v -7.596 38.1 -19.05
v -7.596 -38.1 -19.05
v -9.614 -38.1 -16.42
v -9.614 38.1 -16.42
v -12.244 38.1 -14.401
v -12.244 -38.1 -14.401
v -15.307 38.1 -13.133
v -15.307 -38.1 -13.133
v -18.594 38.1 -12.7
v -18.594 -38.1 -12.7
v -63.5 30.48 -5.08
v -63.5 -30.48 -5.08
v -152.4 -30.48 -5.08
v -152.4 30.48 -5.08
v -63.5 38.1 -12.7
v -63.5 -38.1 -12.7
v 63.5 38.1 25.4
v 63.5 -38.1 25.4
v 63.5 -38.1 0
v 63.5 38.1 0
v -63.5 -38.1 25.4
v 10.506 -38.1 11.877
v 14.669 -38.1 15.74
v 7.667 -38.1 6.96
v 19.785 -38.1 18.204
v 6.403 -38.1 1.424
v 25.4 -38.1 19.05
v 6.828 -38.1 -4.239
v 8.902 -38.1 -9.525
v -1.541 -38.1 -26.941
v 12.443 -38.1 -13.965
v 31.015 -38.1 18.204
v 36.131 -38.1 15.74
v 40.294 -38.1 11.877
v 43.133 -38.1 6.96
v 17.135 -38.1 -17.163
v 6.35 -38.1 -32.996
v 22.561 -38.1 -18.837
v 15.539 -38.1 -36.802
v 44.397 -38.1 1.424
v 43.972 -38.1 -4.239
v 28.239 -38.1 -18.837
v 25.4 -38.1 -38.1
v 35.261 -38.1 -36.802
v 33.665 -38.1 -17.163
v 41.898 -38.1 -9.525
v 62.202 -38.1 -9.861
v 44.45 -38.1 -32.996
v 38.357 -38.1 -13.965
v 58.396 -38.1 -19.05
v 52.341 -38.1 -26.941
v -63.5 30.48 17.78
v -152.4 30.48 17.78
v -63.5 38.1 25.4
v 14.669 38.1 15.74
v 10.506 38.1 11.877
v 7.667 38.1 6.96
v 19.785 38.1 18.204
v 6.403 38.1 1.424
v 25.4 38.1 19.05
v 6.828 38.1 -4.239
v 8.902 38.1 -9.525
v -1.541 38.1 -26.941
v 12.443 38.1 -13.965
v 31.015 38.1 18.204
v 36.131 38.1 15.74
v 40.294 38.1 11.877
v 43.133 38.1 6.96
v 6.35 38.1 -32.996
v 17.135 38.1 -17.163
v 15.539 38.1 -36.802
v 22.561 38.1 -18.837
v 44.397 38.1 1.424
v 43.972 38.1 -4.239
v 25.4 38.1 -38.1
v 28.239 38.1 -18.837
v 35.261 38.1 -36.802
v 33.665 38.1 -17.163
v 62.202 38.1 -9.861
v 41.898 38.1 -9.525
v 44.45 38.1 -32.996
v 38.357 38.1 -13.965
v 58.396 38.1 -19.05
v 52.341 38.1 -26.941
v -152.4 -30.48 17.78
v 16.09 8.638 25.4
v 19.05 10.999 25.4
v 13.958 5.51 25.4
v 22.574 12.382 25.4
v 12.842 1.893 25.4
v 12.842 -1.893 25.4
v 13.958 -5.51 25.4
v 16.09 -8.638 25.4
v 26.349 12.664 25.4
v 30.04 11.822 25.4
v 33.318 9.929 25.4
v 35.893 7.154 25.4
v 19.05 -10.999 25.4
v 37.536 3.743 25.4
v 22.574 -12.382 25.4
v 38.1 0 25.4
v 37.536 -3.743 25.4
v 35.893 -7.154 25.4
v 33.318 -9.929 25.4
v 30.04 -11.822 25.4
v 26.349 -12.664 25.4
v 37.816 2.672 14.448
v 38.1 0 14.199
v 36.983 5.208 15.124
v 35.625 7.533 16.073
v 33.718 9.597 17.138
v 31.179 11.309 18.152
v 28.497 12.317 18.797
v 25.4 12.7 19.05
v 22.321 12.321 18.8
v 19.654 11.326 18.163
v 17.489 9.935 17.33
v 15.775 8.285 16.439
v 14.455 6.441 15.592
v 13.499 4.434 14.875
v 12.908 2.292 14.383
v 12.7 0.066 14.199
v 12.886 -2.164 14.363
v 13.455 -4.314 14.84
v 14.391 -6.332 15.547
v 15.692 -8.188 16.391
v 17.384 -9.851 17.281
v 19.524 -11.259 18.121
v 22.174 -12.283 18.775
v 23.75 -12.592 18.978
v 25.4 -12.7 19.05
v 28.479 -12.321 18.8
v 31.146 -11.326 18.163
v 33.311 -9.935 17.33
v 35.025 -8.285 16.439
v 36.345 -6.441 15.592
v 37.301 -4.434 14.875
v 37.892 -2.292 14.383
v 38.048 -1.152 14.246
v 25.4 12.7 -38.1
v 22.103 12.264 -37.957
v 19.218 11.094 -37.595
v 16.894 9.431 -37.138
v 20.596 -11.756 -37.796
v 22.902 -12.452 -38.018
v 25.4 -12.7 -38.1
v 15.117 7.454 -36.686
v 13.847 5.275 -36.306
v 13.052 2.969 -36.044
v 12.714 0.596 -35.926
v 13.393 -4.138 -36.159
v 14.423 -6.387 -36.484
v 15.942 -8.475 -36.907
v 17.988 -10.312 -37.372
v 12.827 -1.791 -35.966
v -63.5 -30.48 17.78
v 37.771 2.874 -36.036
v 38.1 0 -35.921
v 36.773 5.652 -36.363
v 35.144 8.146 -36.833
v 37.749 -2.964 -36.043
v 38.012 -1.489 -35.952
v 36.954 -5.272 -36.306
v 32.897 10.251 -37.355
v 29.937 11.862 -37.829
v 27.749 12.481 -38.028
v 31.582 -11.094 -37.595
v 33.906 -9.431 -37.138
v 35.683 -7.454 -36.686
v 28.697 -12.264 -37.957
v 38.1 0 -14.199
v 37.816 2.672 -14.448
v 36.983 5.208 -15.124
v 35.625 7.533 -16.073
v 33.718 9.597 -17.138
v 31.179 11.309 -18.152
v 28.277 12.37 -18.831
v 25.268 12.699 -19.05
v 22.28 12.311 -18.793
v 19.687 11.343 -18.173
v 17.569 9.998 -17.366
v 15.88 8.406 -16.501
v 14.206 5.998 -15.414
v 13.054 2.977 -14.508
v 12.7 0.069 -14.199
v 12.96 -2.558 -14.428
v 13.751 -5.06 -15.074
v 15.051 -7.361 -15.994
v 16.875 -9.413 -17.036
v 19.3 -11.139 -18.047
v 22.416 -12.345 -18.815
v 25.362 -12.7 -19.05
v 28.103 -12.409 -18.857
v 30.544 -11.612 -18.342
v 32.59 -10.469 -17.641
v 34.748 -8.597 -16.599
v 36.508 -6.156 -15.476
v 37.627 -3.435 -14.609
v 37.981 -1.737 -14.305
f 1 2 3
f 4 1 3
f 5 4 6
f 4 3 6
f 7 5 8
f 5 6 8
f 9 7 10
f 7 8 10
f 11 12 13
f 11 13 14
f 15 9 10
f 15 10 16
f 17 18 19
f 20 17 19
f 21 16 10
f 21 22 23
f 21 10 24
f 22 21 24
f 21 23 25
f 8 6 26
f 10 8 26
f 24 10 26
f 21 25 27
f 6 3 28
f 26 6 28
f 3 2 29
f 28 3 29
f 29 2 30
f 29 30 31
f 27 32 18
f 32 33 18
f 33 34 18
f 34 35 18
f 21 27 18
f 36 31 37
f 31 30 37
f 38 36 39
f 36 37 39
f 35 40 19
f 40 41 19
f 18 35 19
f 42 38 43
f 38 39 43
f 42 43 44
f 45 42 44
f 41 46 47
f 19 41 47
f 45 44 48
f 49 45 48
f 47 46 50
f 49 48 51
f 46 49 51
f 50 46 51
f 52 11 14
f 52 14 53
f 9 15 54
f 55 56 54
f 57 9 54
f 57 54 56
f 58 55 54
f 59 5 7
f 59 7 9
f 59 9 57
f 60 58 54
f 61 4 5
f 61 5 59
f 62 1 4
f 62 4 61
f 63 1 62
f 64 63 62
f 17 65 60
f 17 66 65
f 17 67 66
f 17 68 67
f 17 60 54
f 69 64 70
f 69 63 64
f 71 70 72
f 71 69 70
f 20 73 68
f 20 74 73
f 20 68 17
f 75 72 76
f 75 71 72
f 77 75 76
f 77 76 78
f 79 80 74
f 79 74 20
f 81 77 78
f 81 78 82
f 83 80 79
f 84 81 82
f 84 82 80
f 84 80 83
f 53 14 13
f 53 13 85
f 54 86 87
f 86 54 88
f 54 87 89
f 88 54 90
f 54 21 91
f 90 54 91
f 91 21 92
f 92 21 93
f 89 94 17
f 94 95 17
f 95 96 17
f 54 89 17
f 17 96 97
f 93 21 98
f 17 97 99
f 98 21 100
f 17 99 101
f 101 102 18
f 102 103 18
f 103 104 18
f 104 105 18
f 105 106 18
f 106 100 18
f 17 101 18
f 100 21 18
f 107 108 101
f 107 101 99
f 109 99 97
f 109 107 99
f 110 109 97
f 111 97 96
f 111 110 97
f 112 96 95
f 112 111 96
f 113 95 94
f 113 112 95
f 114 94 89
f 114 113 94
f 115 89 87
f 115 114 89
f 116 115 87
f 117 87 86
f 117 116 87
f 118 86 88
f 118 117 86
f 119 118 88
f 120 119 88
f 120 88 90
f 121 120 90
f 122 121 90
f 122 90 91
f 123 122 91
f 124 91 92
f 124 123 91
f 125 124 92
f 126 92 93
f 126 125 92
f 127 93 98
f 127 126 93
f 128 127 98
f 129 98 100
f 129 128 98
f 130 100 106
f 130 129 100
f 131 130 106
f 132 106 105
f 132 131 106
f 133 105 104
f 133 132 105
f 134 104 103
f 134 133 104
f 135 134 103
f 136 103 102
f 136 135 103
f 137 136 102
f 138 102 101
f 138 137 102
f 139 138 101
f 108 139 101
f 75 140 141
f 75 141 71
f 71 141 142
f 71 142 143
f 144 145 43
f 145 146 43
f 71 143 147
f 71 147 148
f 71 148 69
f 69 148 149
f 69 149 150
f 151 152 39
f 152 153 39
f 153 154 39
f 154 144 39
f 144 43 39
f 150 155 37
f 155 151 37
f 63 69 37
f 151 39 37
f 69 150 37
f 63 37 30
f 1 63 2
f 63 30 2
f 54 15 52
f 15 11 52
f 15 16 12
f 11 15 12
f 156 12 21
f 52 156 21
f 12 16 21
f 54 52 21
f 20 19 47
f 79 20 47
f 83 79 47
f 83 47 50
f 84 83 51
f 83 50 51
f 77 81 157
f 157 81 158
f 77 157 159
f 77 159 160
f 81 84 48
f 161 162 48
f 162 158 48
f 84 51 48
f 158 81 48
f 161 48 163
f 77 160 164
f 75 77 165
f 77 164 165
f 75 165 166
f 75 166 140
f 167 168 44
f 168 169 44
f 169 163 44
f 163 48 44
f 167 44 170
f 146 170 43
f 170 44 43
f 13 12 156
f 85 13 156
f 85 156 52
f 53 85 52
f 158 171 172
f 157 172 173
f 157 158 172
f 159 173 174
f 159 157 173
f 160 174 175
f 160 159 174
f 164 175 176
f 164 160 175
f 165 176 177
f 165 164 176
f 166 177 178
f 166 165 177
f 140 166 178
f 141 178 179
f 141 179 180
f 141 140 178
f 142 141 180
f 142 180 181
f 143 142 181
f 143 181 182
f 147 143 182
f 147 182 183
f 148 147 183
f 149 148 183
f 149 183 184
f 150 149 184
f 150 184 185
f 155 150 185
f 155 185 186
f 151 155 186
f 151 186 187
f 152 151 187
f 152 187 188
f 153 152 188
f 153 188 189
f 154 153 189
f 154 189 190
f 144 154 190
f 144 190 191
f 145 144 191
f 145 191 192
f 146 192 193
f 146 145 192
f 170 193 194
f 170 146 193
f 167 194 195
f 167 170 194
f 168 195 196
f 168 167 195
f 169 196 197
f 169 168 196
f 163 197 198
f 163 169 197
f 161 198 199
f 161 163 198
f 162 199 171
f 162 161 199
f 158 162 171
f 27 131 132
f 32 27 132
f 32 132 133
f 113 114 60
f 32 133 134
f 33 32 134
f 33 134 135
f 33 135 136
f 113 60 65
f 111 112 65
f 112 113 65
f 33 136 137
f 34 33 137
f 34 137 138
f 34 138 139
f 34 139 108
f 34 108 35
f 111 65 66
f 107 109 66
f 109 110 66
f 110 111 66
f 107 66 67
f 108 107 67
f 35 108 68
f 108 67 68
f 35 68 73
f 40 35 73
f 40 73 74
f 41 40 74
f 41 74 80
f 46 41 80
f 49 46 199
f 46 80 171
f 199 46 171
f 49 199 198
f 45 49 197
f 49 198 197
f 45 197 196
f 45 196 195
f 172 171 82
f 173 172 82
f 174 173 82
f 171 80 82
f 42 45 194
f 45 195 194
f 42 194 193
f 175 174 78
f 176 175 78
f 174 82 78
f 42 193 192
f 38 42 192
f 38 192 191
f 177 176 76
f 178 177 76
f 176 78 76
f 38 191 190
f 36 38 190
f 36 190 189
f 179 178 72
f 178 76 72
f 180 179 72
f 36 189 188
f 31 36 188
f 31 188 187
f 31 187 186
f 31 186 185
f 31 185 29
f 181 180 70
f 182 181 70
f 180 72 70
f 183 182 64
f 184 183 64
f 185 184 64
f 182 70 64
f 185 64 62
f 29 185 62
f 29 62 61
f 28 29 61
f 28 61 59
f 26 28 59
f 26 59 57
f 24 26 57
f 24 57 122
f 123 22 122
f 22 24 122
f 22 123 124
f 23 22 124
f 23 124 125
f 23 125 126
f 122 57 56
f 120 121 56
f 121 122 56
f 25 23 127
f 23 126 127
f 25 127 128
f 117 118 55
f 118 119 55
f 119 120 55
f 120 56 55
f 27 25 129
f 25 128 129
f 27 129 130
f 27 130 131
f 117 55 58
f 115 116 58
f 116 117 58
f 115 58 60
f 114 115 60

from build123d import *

# Parameters (mm, degrees)
BOSS_EXTRUDE1_DEPTH      = 38.1
BOSS_EXTRUDE1_DEPTH_BACK = 38.1
CUT_EXTRUDE1_DEPTH       = 84.279469259
CUT_EXTRUDE1_DEPTH_BACK  = 84.279469259
SKETCH4_R                = 12.7
SKETCH5_W                = 22.86
SKETCH5_H                = 60.96
BOSS_EXTRUDE2_DEPTH      = 88.9
SKETCH6_R                = 19.05
CUT_EXTRUDE2_DEPTH       = 175.596134043


with BuildPart() as part:
    # Sketch2 → Boss-Extrude1 (new, two sides: drawn at the far end of the back side and taken through both)
    with BuildSketch(Plane(origin=(0, 0, 0), x_dir=(1, 0, 0), z_dir=(0, 1, 0)).offset(-BOSS_EXTRUDE1_DEPTH_BACK)):
        with BuildLine():
            Line((-63.5, 12.7), (-63.5, -25.4))
            Line((-63.5, -25.4), (63.5, -25.4))
            Line((63.5, -25.4), (63.5, 0))
            ThreePointArc((63.5, 0), (52.340768363, 26.940768363), (25.4, 38.1))
            ThreePointArc((25.4, 38.1), (6.35, 32.995567884), (-7.595567884, 19.05))
            ThreePointArc((-7.595567884, 19.05), (-12.244090512, 14.401477372), (-18.594090512, 12.7))
            Line((-18.594090512, 12.7), (-63.5, 12.7))
        make_face()
    extrude(amount=BOSS_EXTRUDE1_DEPTH + BOSS_EXTRUDE1_DEPTH_BACK)

    # Sketch4 → Cut-Extrude1 (cut, two sides: drawn at the far end of the back side and taken through both)
    with BuildSketch(Plane.XY.offset(-CUT_EXTRUDE1_DEPTH_BACK)):
        with Locations((25.4, 0)):
            Circle(SKETCH4_R)
    extrude(amount=CUT_EXTRUDE1_DEPTH + CUT_EXTRUDE1_DEPTH_BACK, mode=Mode.SUBTRACT)

    # Sketch5 → Boss-Extrude2 (add)
    with BuildSketch(Plane.ZY.offset(63.5)):
        with Locations((6.35, 0)):
            Rectangle(SKETCH5_W, SKETCH5_H)
    extrude(amount=BOSS_EXTRUDE2_DEPTH)

    # Sketch6 → Cut-Extrude2 (cut, through all)
    with BuildSketch(Plane(origin=(0, 38.1, 0), x_dir=(1, 0, 0), z_dir=(0, 1, 0))):
        with Locations(Location((25.4, 0, 0), (0, 0, 270))):
            Circle(SKETCH6_R)
    extrude(amount=-CUT_EXTRUDE2_DEPTH, mode=Mode.SUBTRACT)


solid = part.part
